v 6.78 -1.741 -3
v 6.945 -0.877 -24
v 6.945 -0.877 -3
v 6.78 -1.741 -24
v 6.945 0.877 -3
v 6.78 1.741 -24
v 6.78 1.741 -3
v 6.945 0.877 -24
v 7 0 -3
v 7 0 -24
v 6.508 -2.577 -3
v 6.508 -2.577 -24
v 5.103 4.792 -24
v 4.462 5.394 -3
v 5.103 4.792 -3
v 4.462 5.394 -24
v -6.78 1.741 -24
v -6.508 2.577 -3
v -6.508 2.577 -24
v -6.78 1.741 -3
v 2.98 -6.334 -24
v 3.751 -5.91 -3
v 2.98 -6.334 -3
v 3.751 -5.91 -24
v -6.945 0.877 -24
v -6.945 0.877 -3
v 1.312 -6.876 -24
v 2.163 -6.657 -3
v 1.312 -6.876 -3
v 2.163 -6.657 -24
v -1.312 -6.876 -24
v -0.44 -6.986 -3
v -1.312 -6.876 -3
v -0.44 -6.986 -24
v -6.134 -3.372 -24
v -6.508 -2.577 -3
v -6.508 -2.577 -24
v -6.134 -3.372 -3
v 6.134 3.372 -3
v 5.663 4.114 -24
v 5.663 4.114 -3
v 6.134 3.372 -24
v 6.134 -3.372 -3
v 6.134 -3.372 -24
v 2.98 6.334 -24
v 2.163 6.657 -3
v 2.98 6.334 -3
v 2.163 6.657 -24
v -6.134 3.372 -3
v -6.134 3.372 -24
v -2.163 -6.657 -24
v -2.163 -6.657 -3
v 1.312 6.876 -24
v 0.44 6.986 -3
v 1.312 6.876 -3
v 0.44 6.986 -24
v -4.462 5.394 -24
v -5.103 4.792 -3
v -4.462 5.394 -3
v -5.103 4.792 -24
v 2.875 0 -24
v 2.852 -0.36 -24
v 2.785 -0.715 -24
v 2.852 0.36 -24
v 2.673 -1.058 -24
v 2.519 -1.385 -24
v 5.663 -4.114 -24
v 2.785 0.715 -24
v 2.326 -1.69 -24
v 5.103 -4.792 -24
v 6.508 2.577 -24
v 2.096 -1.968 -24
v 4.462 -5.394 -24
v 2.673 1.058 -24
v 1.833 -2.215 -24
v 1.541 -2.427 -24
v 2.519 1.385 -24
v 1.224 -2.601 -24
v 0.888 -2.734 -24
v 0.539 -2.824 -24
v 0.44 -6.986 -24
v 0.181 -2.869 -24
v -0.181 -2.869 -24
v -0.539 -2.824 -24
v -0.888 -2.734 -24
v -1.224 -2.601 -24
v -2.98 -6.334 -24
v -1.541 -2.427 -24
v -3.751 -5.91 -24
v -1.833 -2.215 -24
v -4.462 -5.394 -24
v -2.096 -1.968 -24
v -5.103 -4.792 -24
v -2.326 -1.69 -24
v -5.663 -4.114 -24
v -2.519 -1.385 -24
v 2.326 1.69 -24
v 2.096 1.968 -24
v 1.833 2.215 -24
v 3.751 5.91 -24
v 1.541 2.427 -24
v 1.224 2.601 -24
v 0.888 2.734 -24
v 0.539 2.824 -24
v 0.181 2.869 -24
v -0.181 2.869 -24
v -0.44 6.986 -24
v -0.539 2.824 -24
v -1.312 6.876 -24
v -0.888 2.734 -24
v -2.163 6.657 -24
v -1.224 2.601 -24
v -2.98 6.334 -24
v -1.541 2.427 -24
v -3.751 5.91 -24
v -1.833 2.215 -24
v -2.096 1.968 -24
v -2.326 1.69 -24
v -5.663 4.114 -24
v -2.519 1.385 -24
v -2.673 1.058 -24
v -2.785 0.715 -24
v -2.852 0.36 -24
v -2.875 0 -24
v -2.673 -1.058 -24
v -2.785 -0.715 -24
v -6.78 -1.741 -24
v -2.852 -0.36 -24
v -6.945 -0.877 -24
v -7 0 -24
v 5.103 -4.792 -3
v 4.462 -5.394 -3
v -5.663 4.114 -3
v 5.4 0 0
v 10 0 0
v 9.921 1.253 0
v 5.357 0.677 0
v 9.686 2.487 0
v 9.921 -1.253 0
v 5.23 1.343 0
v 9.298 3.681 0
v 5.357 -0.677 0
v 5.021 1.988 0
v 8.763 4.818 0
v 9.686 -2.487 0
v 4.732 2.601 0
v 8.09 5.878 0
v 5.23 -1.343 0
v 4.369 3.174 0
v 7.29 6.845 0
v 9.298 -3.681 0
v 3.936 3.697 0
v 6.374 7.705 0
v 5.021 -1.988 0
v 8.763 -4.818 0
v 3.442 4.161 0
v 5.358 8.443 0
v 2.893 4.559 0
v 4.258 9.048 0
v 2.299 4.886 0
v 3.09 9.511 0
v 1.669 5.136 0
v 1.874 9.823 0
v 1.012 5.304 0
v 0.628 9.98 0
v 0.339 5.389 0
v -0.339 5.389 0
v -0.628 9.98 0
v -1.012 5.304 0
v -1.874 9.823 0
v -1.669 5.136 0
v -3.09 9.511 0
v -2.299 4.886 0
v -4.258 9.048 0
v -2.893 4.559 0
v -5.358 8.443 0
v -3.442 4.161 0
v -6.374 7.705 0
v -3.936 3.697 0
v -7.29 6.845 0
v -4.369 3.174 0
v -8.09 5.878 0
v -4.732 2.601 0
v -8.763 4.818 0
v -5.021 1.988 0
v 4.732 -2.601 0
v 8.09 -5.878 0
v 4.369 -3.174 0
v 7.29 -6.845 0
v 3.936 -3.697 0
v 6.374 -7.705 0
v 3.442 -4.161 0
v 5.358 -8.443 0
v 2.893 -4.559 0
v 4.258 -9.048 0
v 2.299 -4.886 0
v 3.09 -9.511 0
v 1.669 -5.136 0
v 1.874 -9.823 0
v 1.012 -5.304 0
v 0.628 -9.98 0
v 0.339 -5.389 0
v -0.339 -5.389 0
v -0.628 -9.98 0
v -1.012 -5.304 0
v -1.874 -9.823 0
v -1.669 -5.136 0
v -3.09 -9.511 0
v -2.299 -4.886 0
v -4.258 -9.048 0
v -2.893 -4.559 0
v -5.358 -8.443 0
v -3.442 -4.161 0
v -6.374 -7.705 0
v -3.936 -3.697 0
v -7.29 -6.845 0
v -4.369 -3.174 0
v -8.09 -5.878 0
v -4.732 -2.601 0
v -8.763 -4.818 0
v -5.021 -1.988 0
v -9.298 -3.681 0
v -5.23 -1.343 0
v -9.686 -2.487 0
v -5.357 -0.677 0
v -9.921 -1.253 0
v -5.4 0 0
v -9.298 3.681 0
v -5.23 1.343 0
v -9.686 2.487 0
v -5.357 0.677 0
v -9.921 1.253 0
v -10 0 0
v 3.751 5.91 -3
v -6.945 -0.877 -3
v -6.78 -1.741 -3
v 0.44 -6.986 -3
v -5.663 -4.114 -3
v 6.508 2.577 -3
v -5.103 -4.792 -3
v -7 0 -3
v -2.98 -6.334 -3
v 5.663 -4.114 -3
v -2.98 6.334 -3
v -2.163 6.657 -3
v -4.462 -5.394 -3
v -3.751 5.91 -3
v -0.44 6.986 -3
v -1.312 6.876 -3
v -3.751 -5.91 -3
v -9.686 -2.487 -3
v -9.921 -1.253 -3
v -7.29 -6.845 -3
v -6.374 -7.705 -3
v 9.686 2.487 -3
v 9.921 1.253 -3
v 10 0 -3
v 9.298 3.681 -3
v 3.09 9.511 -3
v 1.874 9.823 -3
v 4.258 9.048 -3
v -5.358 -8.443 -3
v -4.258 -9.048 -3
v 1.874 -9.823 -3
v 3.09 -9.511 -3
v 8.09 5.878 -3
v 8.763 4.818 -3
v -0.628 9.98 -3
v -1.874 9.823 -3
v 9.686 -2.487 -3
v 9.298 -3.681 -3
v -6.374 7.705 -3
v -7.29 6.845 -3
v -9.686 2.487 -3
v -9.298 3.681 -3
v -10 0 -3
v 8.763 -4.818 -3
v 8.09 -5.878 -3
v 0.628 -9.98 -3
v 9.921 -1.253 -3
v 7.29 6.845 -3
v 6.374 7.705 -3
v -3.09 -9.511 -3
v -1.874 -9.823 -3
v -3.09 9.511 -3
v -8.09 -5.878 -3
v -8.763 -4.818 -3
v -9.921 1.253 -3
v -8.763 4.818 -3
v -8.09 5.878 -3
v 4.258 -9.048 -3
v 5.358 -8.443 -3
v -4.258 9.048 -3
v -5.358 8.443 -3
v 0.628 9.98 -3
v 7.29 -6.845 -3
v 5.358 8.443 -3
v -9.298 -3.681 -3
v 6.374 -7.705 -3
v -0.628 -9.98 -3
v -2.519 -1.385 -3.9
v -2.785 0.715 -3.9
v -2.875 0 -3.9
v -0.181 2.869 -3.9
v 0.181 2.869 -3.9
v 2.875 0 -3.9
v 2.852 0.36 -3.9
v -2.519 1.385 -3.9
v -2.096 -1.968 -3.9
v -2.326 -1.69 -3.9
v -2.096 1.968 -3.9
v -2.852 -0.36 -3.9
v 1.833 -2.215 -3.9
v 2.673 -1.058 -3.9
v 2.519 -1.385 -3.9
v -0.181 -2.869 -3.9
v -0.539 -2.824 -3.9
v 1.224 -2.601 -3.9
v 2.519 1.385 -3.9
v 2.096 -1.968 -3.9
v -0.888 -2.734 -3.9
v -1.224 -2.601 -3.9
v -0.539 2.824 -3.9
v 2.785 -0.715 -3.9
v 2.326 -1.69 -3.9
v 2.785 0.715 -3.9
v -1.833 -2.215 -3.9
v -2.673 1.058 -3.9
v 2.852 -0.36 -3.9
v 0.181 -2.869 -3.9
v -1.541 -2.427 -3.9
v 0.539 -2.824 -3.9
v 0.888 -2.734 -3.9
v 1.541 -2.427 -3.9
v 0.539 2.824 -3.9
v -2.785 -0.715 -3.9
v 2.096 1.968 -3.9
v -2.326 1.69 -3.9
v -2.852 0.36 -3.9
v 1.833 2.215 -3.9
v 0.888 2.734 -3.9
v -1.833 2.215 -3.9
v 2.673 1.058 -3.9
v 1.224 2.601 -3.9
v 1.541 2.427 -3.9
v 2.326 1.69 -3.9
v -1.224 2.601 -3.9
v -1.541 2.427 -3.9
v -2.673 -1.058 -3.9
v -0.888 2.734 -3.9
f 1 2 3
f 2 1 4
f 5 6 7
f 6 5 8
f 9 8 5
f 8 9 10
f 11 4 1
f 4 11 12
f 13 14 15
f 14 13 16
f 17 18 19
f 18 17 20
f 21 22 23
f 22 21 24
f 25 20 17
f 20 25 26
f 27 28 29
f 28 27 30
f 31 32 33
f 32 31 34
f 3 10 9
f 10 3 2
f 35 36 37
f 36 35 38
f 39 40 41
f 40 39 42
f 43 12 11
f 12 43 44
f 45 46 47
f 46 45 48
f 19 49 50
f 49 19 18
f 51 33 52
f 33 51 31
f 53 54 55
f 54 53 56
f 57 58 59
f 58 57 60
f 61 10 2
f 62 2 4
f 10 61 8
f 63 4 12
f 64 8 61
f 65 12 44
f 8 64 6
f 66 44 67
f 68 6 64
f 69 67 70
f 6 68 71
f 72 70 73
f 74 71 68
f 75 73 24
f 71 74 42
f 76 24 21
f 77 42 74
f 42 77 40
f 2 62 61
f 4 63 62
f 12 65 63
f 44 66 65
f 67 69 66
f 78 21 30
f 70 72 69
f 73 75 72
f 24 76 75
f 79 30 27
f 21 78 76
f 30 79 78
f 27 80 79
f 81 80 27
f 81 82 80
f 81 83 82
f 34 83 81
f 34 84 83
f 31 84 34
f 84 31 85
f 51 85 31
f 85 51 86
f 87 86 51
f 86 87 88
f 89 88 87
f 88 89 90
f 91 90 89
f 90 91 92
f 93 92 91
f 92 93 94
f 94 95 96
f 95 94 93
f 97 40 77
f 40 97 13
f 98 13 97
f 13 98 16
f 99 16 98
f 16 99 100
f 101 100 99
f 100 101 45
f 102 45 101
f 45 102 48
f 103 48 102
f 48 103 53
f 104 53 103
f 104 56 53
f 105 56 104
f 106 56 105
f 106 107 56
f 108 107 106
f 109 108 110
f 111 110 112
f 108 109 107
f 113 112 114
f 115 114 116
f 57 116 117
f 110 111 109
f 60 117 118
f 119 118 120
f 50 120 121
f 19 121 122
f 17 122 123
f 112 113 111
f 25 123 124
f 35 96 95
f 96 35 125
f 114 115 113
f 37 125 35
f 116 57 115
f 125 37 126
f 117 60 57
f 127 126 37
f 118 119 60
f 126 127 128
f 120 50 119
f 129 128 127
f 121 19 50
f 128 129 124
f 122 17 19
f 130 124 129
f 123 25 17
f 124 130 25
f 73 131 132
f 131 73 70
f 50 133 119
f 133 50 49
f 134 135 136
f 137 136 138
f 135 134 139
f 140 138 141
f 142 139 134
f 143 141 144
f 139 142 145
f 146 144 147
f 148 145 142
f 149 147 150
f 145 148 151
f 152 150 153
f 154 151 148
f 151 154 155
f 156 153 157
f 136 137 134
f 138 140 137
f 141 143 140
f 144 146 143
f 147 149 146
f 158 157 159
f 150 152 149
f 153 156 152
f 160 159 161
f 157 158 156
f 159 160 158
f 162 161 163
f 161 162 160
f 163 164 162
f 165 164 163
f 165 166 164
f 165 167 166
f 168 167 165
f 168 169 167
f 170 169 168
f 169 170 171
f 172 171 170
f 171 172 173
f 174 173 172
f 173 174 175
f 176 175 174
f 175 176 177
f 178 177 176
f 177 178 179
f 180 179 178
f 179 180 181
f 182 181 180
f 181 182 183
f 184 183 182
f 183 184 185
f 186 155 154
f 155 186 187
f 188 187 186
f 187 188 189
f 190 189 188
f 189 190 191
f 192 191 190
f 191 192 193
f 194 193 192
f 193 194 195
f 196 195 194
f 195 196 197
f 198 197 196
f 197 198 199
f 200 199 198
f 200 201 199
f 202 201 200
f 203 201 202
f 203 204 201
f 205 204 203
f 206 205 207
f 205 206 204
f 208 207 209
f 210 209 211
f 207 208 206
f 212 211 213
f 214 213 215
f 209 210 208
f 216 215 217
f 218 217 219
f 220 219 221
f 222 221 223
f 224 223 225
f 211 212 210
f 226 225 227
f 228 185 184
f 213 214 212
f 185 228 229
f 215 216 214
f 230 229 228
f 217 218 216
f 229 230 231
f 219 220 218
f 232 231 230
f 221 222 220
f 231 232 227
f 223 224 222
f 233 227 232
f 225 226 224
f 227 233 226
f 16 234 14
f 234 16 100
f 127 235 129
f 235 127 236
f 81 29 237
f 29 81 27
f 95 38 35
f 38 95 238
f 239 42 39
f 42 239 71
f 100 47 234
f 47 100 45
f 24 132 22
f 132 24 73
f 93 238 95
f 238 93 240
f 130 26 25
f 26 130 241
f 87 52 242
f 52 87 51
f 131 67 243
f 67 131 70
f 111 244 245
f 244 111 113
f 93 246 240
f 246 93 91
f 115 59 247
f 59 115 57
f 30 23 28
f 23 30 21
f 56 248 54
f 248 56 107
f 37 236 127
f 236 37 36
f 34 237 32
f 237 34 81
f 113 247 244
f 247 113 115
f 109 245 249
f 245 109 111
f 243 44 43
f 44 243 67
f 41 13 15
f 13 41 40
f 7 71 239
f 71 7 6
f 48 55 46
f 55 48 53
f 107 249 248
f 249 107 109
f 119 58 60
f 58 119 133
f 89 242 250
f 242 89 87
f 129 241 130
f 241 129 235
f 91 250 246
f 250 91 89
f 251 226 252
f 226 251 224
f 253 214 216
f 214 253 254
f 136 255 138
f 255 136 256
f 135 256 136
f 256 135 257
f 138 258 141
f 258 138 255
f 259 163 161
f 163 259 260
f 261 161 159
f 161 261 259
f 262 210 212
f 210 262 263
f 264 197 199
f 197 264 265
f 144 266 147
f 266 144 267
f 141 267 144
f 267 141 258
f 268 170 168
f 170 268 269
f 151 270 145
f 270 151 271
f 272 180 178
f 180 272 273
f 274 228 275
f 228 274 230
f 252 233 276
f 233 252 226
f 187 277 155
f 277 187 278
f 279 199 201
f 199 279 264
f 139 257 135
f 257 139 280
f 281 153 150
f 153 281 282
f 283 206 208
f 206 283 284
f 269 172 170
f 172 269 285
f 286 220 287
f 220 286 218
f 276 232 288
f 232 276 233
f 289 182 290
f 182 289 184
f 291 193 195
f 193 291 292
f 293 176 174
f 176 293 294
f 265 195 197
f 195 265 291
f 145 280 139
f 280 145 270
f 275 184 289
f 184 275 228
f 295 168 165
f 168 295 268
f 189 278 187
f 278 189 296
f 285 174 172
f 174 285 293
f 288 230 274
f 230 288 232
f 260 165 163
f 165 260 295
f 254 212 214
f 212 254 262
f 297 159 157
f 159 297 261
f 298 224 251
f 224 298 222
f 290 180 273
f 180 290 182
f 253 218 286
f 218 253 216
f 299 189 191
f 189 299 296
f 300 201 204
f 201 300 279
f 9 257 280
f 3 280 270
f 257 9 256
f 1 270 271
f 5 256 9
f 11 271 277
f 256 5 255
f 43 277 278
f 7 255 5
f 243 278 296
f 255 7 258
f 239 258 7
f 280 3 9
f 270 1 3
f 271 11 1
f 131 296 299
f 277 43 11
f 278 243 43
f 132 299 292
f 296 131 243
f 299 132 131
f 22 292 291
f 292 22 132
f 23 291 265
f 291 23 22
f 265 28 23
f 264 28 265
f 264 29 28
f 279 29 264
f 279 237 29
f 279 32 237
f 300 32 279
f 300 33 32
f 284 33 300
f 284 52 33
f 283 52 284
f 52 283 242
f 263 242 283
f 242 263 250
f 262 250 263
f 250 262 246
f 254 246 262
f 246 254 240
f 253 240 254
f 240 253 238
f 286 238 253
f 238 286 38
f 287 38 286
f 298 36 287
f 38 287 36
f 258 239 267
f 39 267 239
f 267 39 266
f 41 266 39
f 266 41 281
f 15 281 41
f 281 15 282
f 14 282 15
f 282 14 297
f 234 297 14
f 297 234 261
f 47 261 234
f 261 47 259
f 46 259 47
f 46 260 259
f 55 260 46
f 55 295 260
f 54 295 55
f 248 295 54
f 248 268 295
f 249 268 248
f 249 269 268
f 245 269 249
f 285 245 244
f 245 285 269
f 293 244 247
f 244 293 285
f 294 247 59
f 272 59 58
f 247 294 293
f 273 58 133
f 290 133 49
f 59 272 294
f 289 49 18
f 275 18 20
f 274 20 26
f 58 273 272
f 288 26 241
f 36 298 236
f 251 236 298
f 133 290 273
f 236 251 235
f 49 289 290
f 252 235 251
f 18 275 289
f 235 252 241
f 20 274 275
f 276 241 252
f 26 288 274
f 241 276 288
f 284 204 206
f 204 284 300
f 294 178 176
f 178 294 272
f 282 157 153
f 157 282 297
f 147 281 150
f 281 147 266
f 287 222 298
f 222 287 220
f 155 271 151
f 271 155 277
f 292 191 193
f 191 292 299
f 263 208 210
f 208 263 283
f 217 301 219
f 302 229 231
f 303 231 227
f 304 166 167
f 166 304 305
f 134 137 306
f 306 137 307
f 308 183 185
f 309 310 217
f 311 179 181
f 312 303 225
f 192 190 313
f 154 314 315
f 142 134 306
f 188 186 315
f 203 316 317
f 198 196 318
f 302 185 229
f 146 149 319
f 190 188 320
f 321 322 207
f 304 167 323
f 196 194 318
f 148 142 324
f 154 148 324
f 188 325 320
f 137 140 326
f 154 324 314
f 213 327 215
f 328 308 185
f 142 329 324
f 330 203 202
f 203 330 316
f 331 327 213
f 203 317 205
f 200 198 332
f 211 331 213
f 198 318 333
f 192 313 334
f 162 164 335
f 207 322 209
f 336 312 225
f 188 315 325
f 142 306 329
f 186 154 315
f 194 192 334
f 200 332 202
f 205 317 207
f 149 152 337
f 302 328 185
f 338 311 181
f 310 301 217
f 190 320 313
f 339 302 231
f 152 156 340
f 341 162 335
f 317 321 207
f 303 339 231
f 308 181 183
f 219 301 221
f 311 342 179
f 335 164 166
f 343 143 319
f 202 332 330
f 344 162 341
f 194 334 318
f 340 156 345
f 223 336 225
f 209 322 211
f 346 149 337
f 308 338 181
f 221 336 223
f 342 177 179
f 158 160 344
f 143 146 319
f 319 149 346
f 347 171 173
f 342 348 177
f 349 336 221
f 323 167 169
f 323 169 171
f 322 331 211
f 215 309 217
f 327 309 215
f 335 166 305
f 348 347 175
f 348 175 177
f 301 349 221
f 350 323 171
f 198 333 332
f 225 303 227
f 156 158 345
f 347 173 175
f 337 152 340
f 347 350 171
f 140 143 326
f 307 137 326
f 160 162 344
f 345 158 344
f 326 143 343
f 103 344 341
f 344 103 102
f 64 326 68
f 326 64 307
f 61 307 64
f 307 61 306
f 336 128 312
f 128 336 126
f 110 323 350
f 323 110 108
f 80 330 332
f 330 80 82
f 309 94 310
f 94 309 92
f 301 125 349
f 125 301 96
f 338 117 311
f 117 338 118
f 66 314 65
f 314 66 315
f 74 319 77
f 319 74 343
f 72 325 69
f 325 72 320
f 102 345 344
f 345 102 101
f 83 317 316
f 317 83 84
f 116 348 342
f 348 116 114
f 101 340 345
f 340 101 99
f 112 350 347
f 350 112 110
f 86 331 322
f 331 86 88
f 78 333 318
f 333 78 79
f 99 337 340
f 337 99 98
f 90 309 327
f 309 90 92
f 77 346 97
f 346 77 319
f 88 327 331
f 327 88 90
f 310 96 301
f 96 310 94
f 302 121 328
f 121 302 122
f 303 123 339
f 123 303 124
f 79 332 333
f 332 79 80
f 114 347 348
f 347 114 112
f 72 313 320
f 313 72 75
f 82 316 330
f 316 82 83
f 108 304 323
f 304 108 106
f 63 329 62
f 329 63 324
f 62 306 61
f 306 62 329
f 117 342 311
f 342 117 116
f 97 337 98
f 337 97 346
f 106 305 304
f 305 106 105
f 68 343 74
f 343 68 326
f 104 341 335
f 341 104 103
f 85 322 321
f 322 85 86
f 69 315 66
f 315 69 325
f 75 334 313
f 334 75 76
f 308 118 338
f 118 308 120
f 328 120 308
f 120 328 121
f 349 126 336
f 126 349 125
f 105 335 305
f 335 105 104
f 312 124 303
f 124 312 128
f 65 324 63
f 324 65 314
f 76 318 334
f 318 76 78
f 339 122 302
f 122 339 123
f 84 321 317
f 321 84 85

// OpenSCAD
$fn = 50;


difference() {
	union() {
		translate(v = [0, 0, -24.0000000000]) {
			cylinder(h = 24, r = 7.0000000000);
		}
		translate(v = [0, 0, -3.0000000000]) {
			cylinder(h = 3, r = 10.0000000000);
		}
	}
	union() {
		translate(v = [0, 0, 0]) {
			rotate(a = [0, 0, 0]) {
				difference() {
					union() {
						#translate(v = [0, 0, -24.0000000000]) {
							cylinder(h = 24, r = 2.6000000000);
						}
						#translate(v = [0, 0, -3.9000000000]) {
							cylinder(h = 3.9000000000, r1 = 2.8750000000, r2 = 5.4000000000);
						}
						#translate(v = [0, 0, -24.0000000000]) {
							cylinder(h = 24, r = 2.8750000000);
						}
						#translate(v = [0, 0, -24.0000000000]) {
							cylinder(h = 24, r = 2.6000000000);
						}
					}
					union();
				}
			}
		}
	}
}
